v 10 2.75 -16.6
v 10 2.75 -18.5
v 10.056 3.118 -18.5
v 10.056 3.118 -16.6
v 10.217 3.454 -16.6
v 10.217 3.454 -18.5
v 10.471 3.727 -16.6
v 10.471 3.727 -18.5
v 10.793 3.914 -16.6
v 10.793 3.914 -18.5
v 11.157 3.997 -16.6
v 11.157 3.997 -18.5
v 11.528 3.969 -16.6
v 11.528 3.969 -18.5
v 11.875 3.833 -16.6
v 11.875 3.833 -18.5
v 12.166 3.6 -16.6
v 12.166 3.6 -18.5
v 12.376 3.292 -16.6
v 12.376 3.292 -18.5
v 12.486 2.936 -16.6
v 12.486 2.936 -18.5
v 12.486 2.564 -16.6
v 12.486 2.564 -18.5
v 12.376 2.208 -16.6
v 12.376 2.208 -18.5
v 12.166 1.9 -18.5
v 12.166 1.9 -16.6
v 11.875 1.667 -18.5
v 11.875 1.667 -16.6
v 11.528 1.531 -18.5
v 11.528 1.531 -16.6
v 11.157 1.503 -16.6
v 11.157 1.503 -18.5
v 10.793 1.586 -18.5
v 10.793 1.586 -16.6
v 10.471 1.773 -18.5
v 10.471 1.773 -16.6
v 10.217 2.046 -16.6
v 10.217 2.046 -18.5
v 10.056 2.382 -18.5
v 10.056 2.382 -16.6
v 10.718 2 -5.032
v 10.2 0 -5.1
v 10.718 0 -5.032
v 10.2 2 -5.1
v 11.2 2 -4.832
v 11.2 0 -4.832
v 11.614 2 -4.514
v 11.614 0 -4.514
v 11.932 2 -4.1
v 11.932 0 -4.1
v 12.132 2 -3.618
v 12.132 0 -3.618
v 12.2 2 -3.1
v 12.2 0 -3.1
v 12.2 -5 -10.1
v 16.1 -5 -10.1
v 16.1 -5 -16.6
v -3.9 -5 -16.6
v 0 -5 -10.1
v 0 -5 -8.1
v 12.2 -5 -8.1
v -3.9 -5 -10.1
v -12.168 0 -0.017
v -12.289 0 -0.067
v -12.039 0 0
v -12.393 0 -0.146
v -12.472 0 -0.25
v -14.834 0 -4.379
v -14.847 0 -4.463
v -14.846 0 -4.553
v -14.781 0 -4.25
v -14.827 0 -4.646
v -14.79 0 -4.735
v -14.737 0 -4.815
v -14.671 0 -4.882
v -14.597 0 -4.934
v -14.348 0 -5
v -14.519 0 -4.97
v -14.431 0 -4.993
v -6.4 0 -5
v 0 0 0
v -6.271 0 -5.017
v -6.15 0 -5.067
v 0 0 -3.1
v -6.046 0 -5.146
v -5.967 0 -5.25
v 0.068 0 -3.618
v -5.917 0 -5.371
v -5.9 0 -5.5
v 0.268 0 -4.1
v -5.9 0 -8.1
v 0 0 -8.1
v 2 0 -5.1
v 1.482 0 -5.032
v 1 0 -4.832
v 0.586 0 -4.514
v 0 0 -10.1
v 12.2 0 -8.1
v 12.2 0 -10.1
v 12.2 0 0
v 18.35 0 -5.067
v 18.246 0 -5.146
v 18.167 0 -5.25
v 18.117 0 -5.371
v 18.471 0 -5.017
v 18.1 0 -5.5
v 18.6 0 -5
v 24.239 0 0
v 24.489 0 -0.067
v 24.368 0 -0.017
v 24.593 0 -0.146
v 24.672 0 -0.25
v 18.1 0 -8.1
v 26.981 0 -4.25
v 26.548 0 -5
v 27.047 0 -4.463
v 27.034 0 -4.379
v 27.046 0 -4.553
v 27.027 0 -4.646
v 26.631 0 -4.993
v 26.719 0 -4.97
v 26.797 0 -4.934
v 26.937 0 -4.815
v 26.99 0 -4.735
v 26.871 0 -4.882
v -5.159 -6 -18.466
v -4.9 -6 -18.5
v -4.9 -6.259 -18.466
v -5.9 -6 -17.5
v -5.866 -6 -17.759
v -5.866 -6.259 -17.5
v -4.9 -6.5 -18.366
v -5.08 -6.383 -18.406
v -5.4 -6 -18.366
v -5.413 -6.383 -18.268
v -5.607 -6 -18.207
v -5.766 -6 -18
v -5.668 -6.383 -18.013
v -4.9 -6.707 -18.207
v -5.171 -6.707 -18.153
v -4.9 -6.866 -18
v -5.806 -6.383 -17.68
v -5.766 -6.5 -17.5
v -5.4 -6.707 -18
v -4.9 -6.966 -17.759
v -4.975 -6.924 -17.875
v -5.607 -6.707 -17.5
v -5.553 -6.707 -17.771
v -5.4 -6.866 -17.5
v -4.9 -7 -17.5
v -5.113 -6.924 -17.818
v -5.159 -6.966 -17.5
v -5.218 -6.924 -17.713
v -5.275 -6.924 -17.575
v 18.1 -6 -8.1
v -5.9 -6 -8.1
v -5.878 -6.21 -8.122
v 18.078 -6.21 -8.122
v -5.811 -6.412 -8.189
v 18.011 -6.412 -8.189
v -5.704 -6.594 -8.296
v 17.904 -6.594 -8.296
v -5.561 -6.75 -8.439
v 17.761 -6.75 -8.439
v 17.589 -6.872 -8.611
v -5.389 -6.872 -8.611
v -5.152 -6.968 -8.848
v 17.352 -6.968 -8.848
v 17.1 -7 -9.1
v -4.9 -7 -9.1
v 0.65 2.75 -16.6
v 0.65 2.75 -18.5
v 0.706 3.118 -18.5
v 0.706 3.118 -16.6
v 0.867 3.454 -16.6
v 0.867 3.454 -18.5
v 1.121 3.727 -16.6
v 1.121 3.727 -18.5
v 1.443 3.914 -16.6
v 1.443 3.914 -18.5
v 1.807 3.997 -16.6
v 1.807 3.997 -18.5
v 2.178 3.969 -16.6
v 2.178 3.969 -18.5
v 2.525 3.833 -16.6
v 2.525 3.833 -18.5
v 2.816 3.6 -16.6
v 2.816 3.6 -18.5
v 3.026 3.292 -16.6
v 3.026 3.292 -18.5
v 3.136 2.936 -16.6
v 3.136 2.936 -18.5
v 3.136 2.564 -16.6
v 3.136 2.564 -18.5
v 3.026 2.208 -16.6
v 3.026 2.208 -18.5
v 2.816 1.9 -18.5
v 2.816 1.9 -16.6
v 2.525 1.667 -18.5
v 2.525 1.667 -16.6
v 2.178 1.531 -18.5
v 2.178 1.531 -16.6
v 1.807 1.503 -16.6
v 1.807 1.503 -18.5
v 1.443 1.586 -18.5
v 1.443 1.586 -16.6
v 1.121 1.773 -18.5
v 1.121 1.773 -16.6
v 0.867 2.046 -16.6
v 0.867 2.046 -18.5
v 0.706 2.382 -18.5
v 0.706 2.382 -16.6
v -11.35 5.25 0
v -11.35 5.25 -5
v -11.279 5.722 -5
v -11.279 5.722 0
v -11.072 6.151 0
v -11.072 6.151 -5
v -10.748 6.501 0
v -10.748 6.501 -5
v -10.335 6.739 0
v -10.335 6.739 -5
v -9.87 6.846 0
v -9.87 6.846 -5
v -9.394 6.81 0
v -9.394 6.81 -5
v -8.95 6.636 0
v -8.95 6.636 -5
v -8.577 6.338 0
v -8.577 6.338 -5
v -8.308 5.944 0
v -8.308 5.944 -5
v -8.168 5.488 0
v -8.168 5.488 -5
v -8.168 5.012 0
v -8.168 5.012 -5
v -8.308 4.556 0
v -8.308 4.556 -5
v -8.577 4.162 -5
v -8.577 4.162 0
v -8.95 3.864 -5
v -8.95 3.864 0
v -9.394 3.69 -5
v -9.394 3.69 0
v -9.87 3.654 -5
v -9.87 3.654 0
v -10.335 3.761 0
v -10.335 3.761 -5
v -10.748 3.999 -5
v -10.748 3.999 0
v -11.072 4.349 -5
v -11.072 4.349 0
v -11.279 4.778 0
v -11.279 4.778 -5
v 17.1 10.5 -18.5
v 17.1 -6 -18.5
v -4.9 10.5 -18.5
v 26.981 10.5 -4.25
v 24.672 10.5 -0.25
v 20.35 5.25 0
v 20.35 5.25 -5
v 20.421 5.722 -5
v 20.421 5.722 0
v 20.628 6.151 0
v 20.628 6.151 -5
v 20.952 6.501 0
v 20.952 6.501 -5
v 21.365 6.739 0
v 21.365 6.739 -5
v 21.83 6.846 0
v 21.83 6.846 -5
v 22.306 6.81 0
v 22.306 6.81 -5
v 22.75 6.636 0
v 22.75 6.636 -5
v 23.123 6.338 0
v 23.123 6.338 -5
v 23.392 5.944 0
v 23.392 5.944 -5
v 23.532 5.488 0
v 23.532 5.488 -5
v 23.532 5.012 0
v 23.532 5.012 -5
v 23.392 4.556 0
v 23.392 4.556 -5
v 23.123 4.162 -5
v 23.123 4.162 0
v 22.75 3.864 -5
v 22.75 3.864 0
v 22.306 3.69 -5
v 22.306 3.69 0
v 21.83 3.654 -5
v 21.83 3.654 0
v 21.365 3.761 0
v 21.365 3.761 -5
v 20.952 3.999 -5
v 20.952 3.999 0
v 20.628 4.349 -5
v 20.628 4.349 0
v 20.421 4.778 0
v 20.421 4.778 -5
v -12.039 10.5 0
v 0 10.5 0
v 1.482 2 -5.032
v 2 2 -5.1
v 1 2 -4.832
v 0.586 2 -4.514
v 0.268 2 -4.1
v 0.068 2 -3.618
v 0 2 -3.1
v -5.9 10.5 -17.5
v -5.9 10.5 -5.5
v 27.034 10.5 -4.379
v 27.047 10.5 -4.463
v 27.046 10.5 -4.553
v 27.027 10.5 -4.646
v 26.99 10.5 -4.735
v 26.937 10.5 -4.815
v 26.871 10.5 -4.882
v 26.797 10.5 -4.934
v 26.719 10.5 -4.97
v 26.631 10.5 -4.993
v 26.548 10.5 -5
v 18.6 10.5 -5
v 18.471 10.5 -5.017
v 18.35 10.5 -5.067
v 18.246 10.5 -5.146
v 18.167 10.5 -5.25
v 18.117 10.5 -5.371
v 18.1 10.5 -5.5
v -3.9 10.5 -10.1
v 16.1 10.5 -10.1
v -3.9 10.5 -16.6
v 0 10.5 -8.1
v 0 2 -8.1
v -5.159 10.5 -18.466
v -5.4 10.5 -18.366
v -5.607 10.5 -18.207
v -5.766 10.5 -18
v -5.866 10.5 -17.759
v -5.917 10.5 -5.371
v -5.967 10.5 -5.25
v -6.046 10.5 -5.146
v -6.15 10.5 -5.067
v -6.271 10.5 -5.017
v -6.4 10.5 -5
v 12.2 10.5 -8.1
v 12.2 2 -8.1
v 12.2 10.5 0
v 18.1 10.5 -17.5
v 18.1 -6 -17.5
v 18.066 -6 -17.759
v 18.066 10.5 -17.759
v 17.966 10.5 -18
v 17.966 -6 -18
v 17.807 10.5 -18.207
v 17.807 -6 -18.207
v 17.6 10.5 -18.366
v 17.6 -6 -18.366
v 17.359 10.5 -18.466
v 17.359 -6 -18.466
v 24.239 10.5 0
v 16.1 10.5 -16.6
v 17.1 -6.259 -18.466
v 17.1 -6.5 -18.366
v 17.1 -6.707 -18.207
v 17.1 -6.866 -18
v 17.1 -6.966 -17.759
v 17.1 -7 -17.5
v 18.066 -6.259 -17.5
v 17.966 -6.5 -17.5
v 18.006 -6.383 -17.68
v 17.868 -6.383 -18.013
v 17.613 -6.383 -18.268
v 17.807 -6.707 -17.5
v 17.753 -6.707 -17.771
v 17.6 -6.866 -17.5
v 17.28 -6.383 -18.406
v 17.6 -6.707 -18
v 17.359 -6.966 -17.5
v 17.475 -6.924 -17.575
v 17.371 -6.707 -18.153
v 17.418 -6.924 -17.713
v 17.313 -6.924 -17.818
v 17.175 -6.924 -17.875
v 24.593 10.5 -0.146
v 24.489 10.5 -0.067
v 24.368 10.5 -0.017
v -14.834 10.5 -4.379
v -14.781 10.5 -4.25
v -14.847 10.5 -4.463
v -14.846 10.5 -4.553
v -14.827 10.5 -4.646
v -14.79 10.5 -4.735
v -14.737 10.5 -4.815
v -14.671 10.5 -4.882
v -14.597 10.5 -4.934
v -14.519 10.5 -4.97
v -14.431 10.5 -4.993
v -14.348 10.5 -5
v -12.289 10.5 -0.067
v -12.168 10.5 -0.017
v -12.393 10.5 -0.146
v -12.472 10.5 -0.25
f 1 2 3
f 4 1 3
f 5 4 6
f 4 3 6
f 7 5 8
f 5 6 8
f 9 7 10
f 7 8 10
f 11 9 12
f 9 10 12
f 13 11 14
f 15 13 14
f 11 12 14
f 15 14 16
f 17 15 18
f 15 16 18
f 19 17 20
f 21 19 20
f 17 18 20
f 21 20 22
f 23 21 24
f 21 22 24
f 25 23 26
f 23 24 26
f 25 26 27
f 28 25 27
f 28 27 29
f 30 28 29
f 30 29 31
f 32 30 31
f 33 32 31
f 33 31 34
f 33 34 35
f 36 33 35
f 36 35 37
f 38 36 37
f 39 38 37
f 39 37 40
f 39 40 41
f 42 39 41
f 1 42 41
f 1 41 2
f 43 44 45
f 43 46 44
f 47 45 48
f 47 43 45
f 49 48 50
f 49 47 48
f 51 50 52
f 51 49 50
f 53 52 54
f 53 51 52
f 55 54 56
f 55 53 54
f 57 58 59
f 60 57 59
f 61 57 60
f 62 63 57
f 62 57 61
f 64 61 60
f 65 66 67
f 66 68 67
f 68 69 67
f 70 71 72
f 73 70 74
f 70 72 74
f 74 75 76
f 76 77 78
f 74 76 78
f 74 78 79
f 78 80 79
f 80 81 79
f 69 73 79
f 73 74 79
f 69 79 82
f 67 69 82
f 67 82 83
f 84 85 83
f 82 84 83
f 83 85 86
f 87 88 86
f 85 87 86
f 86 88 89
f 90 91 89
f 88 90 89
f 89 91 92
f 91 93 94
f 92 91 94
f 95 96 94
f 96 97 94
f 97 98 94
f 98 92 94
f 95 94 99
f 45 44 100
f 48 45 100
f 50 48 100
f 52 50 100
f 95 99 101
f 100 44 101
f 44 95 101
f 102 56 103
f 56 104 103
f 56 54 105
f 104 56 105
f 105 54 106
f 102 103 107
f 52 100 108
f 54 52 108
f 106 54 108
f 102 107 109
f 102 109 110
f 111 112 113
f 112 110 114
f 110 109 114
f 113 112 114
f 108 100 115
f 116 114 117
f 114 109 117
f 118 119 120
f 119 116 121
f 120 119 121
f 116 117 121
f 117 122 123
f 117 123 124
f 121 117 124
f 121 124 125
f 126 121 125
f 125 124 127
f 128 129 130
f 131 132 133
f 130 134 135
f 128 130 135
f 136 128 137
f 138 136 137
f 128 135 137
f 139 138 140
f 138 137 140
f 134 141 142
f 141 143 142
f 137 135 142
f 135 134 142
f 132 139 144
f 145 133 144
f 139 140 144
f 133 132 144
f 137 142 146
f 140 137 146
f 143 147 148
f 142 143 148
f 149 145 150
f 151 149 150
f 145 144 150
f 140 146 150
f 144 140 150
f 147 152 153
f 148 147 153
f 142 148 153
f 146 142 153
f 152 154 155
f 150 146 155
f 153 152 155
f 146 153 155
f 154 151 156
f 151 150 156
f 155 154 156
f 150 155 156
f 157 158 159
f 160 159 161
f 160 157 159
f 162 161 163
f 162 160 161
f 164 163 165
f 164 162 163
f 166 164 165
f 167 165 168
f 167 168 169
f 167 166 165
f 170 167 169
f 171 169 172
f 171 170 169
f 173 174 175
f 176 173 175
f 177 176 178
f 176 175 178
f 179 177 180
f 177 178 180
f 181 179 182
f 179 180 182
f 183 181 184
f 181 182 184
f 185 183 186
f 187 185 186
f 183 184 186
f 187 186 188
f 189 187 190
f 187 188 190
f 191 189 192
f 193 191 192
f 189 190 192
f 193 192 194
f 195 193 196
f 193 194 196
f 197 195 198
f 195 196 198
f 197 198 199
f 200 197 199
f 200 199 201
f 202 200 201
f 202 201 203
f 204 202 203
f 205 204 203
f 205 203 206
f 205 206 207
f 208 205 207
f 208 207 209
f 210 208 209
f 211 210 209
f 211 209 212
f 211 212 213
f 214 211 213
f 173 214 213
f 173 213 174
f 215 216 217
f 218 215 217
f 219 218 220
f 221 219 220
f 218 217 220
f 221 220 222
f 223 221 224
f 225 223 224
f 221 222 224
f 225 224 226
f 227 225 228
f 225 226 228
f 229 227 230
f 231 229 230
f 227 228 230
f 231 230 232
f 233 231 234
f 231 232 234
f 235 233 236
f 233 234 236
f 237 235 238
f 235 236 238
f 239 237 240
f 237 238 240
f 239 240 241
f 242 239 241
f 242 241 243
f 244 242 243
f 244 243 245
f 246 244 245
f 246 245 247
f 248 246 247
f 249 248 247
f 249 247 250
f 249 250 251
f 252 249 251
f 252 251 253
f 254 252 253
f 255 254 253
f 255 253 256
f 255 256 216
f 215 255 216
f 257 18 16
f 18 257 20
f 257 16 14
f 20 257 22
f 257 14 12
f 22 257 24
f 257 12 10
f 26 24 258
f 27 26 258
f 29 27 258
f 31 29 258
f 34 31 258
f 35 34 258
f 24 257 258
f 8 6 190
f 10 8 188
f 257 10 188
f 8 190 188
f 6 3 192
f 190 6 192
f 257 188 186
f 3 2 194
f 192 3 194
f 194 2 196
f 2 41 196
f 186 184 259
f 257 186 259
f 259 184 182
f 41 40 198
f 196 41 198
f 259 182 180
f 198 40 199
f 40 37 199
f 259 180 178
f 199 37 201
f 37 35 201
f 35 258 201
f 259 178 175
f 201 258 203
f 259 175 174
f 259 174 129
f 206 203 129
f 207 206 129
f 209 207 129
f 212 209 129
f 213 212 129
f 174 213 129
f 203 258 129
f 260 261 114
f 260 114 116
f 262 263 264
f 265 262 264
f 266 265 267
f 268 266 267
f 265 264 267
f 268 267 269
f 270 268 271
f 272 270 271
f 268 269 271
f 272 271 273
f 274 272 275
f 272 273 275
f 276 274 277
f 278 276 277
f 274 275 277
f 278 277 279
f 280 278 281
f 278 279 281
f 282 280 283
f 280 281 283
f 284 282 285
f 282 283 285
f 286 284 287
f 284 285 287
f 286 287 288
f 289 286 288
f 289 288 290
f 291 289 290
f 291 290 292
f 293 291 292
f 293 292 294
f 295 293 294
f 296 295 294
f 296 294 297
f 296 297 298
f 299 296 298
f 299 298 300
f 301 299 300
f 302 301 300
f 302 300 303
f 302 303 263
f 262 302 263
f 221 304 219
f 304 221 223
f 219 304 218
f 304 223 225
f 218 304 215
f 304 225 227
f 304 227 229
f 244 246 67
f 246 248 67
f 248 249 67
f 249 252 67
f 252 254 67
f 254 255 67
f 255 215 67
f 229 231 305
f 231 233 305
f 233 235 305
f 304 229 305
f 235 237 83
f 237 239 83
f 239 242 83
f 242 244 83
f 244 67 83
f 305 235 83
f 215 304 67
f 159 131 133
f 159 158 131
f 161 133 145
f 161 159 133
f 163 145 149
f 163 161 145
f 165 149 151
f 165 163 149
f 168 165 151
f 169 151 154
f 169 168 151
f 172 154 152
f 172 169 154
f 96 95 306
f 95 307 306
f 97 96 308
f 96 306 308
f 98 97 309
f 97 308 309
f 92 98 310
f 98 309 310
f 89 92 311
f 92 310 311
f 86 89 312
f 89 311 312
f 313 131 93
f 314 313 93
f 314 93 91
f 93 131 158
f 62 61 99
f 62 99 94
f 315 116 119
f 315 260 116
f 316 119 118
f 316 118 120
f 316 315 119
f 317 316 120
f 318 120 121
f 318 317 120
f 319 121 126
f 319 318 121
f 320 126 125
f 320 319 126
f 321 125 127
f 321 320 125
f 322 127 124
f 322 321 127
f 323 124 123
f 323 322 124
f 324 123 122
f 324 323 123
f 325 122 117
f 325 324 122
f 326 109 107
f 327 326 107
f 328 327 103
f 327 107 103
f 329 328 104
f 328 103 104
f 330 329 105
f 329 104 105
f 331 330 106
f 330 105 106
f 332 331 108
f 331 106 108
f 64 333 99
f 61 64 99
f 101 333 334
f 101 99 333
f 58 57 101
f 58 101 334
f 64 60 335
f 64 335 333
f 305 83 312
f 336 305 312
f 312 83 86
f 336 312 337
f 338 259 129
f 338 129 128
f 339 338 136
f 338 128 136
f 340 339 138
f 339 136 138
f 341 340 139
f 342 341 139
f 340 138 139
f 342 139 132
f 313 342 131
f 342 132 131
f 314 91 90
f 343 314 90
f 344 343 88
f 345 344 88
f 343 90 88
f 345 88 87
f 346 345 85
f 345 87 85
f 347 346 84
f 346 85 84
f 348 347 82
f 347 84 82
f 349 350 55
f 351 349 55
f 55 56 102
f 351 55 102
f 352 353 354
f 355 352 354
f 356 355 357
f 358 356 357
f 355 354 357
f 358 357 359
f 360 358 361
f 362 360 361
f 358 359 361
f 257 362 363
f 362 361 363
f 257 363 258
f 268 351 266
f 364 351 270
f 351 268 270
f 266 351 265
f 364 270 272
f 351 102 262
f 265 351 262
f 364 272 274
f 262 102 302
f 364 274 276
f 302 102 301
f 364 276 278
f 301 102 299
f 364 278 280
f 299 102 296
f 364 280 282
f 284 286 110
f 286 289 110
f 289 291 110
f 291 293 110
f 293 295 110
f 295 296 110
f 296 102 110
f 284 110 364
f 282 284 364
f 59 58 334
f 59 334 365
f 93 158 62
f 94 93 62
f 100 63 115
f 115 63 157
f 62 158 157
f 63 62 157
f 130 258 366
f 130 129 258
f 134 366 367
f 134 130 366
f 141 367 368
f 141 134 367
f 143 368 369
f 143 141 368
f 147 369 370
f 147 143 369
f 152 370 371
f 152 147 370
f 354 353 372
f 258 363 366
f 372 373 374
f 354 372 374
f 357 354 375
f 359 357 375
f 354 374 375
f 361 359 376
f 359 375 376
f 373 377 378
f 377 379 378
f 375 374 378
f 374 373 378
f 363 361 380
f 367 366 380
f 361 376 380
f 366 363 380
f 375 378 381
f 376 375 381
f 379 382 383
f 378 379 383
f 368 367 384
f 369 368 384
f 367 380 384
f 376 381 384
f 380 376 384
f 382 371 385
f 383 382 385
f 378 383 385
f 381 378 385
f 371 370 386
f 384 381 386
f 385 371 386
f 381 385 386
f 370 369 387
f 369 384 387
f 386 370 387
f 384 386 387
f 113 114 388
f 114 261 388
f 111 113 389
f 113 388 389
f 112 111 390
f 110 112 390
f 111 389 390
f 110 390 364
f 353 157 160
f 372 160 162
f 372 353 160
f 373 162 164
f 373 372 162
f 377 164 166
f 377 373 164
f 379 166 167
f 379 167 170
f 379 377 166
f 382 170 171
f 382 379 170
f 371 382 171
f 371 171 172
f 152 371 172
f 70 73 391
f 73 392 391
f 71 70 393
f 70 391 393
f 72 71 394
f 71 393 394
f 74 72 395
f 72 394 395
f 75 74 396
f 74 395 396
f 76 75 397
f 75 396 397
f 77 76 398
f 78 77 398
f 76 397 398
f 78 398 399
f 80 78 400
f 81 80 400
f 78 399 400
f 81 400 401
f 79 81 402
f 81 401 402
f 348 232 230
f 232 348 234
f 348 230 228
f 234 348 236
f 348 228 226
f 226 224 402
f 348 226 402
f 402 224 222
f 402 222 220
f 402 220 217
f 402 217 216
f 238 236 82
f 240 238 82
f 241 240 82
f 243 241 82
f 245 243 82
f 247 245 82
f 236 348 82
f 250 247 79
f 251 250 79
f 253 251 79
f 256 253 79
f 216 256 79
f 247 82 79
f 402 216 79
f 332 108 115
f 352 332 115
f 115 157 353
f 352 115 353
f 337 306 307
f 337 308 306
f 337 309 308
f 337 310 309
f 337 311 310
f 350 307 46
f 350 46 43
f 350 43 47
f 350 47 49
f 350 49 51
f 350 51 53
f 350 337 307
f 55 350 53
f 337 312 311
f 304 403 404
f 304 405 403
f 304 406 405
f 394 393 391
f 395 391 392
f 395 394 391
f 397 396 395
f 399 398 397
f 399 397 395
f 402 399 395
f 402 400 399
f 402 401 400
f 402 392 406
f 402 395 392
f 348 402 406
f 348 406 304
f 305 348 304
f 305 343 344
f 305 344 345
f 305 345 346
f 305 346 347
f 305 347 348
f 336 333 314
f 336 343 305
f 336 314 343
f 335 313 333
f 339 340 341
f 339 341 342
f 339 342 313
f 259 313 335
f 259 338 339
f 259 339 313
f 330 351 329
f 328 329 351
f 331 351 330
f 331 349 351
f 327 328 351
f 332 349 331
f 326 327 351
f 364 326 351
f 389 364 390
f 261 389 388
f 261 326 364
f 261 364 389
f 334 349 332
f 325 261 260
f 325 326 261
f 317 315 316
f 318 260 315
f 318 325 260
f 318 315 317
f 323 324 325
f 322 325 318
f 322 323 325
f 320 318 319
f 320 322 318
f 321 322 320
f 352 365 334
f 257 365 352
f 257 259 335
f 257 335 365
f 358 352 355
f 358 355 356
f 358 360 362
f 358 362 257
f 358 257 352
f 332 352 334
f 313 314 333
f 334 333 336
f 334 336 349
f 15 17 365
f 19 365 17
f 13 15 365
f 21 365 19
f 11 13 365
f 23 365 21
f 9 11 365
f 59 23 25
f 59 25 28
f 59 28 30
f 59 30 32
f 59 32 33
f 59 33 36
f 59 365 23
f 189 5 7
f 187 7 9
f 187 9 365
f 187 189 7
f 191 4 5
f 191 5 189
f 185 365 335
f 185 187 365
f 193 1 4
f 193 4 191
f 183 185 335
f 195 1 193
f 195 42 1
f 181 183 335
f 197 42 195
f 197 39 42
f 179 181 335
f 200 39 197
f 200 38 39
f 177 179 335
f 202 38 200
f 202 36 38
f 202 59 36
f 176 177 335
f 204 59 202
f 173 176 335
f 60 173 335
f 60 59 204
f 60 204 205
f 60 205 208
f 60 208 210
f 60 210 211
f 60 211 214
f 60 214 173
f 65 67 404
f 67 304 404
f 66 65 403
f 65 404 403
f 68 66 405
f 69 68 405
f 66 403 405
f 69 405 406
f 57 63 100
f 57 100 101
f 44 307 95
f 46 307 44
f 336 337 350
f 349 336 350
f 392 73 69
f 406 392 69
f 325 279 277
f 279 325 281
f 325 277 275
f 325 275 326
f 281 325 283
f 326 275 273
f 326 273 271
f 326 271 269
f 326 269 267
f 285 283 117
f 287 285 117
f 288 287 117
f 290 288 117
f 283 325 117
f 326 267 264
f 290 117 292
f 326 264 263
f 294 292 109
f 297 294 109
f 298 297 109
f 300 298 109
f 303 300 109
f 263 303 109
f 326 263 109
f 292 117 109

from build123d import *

# Parameters (mm, degrees)
SKETCH1_W           = 20
SKETCH1_H           = 6.5
BOSS_EXTRUDE1_DEPTH = 10.5
BOSS_EXTRUDE2_START = 5
BOSS_EXTRUDE2_DEPTH = 5
BOSS_EXTRUDE3_START = 2
BOSS_EXTRUDE3_DEPTH = 2
SKETCH7_W           = 12.2
SKETCH7_H           = 2
BOSS_EXTRUDE5_DEPTH = 3
FILLET2_R           = 2
CUT_EXTRUDE2_REACH  = 34.554
SKETCH8_R           = 1.6
CUT_EXTRUDE3_REACH  = 36.925
FILLET8_R           = 0.5
FILLET9_R           = 1
CUT_EXTRUDE4_REACH  = 36.411
SKETCH10_R          = 1.25


with BuildPart() as part:
    # Sketch1 → Boss-Extrude1 (new body)
    with BuildSketch(Plane(origin=(0, 0, 0), x_dir=(1, 0, 0), z_dir=(0, 1, 0))):
        with BuildLine():
            Line((0, 0), (0, 8.1))
            Line((0, 8.1), (12.2, 8.1))
            Line((12.2, 8.1), (12.2, 0))
            Line((12.2, 0), (27.7, 0))
            Line((27.7, 0), (27.7, 4.5))
            ThreePointArc((27.7, 4.5), (27.553553391, 4.853553391), (27.2, 5))
            Line((27.2, 5), (18.6, 5))
            ThreePointArc((18.6, 5), (18.246446609, 5.146446609), (18.1, 5.5))
            Line((18.1, 5.5), (18.1, 17.5))
            ThreePointArc((18.1, 17.5), (17.807106781, 18.207106781), (17.1, 18.5))
            Line((17.1, 18.5), (-4.9, 18.5))
            ThreePointArc((-4.9, 18.5), (-5.607106781, 18.207106781), (-5.9, 17.5))
            Line((-5.9, 17.5), (-5.9, 5.5))
            ThreePointArc((-5.9, 5.5), (-6.046446609, 5.146446609), (-6.4, 5))
            Line((-6.4, 5), (-15, 5))
            ThreePointArc((-15, 5), (-15.353553391, 4.853553391), (-15.5, 4.5))
            Line((-15.5, 4.5), (-15.5, 0))
            Line((-15.5, 0), (0, 0))
        make_face()
        with Locations((6.1, 13.35)):
            Rectangle(SKETCH1_W, SKETCH1_H, mode=Mode.SUBTRACT)
    extrude(amount=BOSS_EXTRUDE1_DEPTH)

    # Sketch5 → Boss-Extrude2 (add)
    with BuildSketch(Plane.XZ.offset(BOSS_EXTRUDE2_START)):
        with BuildLine():
            Line((0, -8.1), (-5.9, -8.1))
            Line((-5.9, -8.1), (-5.9, -17.5))
            ThreePointArc((-5.9, -17.5), (-5.607106781, -18.207106781), (-4.9, -18.5))
            Line((-4.9, -18.5), (17.1, -18.5))
            ThreePointArc((17.1, -18.5), (17.807106781, -18.207106781), (18.1, -17.5))
            Line((18.1, -17.5), (18.1, -8.1))
            Line((18.1, -8.1), (12.2, -8.1))
            Line((12.2, -8.1), (12.2, -10.1))
            Line((12.2, -10.1), (16.1, -10.1))
            Line((16.1, -10.1), (16.1, -16.6))
            Line((16.1, -16.6), (-3.9, -16.6))
            Line((-3.9, -16.6), (-3.9, -10.1))
            Line((-3.9, -10.1), (0, -10.1))
            Line((0, -10.1), (0, -8.1))
        make_face()
    extrude(amount=-BOSS_EXTRUDE2_DEPTH)

    # Sketch6 → Boss-Extrude3 (add)
    with BuildSketch(Plane.XZ.offset(5).offset(BOSS_EXTRUDE3_START)):
        with BuildLine():
            Line((-5.9, -8.1), (18.1, -8.1))
            Line((18.1, -8.1), (18.1, -17.5))
            ThreePointArc((18.1, -17.5), (17.807106781, -18.207106781), (17.1, -18.5))
            Line((17.1, -18.5), (-4.9, -18.5))
            ThreePointArc((-4.9, -18.5), (-5.607106781, -18.207106781), (-5.9, -17.5))
            Line((-5.9, -17.5), (-5.9, -8.1))
        make_face()
    extrude(amount=-BOSS_EXTRUDE3_DEPTH)

    # Sketch7 → Boss-Extrude5 (add)
    with BuildSketch(Plane.XY.offset(-8.1)):
        with Locations((6.1, 1)):
            Rectangle(SKETCH7_W, SKETCH7_H)
    extrude(amount=BOSS_EXTRUDE5_DEPTH)

    # Fillet2
    fillet2_edges = [part.edges().sort_by_distance(p)[0] for p in [
        (12.2, 1, -5.1),
        (0, 1, -5.1),
    ]]
    fillet(fillet2_edges, radius=FILLET2_R)

    # Sketch8 → Cut-Extrude2 (cut, up to next)
    with BuildSketch(Plane(origin=(0, 0, -5), x_dir=(-1, 0, 0), z_dir=(0, 0, -1)), mode=Mode.PRIVATE) as cut_extrude2_sk1:
        with Locations((-21.95, 5.25)):
            Circle(SKETCH8_R)
    cut_extrude2_tool1 = extrude(cut_extrude2_sk1.sketch, amount=-CUT_EXTRUDE2_REACH, mode=Mode.PRIVATE) & part.part
    # Sketch8 → Cut-Extrude2 (cut, up to next)
    with BuildSketch(Plane(origin=(0, 0, -5), x_dir=(-1, 0, 0), z_dir=(0, 0, -1)), mode=Mode.PRIVATE) as cut_extrude2_sk2:
        with Locations((9.75, 5.25)):
            Circle(SKETCH8_R)
    cut_extrude2_tool2 = extrude(cut_extrude2_sk2.sketch, amount=-CUT_EXTRUDE2_REACH, mode=Mode.PRIVATE) & part.part
    add(cut_extrude2_tool1.solids().sort_by_distance((21.95, 5.25, -5))[0], mode=Mode.SUBTRACT)
    add(cut_extrude2_tool2.solids().sort_by_distance((-9.75, 5.25, -5))[0], mode=Mode.SUBTRACT)

    # Sketch9 → Cut-Extrude3 (cut, up to next)
    with BuildSketch(Plane.XZ, mode=Mode.PRIVATE) as cut_extrude3_sk1:
        with BuildLine():
            Line((24.52766766, 0), (27.392231541, -4.961570184))
            ThreePointArc((27.392231541, -4.961570184), (27.616002266, -4.777384417), (27.7, -4.5))
            Line((27.7, -4.5), (27.7, 0))
            Line((27.7, 0), (24.52766766, 0))
        make_face()
    cut_extrude3_tool1 = extrude(cut_extrude3_sk1.sketch, amount=-CUT_EXTRUDE3_REACH, mode=Mode.PRIVATE) & part.part
    # Sketch9 → Cut-Extrude3 (cut, up to next)
    with BuildSketch(Plane.XZ, mode=Mode.PRIVATE) as cut_extrude3_sk2:
        with BuildLine():
            Line((-12.327667659, 0), (-15.5, 0))
            Line((-15.5, 0), (-15.5, -4.5))
            ThreePointArc((-15.5, -4.5), (-15.416002266, -4.777384417), (-15.19223154, -4.961570184))
            Line((-15.19223154, -4.961570184), (-12.327667659, 0))
        make_face()
    cut_extrude3_tool2 = extrude(cut_extrude3_sk2.sketch, amount=-CUT_EXTRUDE3_REACH, mode=Mode.PRIVATE) & part.part
    add(cut_extrude3_tool1.solids().sort_by_distance((26.628979, 0, -1.786116))[0], mode=Mode.SUBTRACT)
    add(cut_extrude3_tool2.solids().sort_by_distance((-14.428979, 0, -1.786116))[0], mode=Mode.SUBTRACT)

    # Fillet8
    fillet8_edges = [part.edges().sort_by_distance(p)[0] for p in [
        (-12.327667659, 5.25, 0),
    ]]
    fillet(fillet8_edges, radius=FILLET8_R)
    fillet8_2_edges = [part.edges().sort_by_distance(p)[0] for p in [
        (-15.19223154, 5.25, -4.961570184),
    ]]
    fillet(fillet8_2_edges, radius=FILLET8_R)
    fillet8_3_edges = [part.edges().sort_by_distance(p)[0] for p in [
        (27.392231541, 5.25, -4.961570184),
    ]]
    fillet(fillet8_3_edges, radius=FILLET8_R)
    fillet8_4_edges = [part.edges().sort_by_distance(p)[0] for p in [
        (24.52766766, 5.25, 0),
    ]]
    fillet(fillet8_4_edges, radius=FILLET8_R)

    # Fillet9
    fillet9_edges = [part.edges().sort_by_distance(p)[0] for p in [
        (-5.9, -7, -12.8),
        (18.1, -7, -12.8),
        (6.1, -7, -8.1),
        (-5.607106781, -7, -18.207106781),
        (6.1, -7, -18.5),
        (17.807106781, -7, -18.207106781),
    ]]
    fillet(fillet9_edges, radius=FILLET9_R)

    # Sketch10 → Cut-Extrude4 (cut, up to next)
    with BuildSketch(Plane(origin=(0, 0, -18.5), x_dir=(-1, 0, 0), z_dir=(0, 0, -1)), mode=Mode.PRIVATE) as cut_extrude4_sk1:
        with Locations((-11.25, 2.75)):
            Circle(SKETCH10_R)
    cut_extrude4_tool1 = extrude(cut_extrude4_sk1.sketch, amount=-CUT_EXTRUDE4_REACH, mode=Mode.PRIVATE) & part.part
    # Sketch10 → Cut-Extrude4 (cut, up to next)
    with BuildSketch(Plane(origin=(0, 0, -18.5), x_dir=(-1, 0, 0), z_dir=(0, 0, -1)), mode=Mode.PRIVATE) as cut_extrude4_sk2:
        with Locations((-1.9, 2.75)):
            Circle(SKETCH10_R)
    cut_extrude4_tool2 = extrude(cut_extrude4_sk2.sketch, amount=-CUT_EXTRUDE4_REACH, mode=Mode.PRIVATE) & part.part
    add(cut_extrude4_tool1.solids().sort_by_distance((11.25, 2.75, -18.5))[0], mode=Mode.SUBTRACT)
    add(cut_extrude4_tool2.solids().sort_by_distance((1.9, 2.75, -18.5))[0], mode=Mode.SUBTRACT)


solid = part.part
